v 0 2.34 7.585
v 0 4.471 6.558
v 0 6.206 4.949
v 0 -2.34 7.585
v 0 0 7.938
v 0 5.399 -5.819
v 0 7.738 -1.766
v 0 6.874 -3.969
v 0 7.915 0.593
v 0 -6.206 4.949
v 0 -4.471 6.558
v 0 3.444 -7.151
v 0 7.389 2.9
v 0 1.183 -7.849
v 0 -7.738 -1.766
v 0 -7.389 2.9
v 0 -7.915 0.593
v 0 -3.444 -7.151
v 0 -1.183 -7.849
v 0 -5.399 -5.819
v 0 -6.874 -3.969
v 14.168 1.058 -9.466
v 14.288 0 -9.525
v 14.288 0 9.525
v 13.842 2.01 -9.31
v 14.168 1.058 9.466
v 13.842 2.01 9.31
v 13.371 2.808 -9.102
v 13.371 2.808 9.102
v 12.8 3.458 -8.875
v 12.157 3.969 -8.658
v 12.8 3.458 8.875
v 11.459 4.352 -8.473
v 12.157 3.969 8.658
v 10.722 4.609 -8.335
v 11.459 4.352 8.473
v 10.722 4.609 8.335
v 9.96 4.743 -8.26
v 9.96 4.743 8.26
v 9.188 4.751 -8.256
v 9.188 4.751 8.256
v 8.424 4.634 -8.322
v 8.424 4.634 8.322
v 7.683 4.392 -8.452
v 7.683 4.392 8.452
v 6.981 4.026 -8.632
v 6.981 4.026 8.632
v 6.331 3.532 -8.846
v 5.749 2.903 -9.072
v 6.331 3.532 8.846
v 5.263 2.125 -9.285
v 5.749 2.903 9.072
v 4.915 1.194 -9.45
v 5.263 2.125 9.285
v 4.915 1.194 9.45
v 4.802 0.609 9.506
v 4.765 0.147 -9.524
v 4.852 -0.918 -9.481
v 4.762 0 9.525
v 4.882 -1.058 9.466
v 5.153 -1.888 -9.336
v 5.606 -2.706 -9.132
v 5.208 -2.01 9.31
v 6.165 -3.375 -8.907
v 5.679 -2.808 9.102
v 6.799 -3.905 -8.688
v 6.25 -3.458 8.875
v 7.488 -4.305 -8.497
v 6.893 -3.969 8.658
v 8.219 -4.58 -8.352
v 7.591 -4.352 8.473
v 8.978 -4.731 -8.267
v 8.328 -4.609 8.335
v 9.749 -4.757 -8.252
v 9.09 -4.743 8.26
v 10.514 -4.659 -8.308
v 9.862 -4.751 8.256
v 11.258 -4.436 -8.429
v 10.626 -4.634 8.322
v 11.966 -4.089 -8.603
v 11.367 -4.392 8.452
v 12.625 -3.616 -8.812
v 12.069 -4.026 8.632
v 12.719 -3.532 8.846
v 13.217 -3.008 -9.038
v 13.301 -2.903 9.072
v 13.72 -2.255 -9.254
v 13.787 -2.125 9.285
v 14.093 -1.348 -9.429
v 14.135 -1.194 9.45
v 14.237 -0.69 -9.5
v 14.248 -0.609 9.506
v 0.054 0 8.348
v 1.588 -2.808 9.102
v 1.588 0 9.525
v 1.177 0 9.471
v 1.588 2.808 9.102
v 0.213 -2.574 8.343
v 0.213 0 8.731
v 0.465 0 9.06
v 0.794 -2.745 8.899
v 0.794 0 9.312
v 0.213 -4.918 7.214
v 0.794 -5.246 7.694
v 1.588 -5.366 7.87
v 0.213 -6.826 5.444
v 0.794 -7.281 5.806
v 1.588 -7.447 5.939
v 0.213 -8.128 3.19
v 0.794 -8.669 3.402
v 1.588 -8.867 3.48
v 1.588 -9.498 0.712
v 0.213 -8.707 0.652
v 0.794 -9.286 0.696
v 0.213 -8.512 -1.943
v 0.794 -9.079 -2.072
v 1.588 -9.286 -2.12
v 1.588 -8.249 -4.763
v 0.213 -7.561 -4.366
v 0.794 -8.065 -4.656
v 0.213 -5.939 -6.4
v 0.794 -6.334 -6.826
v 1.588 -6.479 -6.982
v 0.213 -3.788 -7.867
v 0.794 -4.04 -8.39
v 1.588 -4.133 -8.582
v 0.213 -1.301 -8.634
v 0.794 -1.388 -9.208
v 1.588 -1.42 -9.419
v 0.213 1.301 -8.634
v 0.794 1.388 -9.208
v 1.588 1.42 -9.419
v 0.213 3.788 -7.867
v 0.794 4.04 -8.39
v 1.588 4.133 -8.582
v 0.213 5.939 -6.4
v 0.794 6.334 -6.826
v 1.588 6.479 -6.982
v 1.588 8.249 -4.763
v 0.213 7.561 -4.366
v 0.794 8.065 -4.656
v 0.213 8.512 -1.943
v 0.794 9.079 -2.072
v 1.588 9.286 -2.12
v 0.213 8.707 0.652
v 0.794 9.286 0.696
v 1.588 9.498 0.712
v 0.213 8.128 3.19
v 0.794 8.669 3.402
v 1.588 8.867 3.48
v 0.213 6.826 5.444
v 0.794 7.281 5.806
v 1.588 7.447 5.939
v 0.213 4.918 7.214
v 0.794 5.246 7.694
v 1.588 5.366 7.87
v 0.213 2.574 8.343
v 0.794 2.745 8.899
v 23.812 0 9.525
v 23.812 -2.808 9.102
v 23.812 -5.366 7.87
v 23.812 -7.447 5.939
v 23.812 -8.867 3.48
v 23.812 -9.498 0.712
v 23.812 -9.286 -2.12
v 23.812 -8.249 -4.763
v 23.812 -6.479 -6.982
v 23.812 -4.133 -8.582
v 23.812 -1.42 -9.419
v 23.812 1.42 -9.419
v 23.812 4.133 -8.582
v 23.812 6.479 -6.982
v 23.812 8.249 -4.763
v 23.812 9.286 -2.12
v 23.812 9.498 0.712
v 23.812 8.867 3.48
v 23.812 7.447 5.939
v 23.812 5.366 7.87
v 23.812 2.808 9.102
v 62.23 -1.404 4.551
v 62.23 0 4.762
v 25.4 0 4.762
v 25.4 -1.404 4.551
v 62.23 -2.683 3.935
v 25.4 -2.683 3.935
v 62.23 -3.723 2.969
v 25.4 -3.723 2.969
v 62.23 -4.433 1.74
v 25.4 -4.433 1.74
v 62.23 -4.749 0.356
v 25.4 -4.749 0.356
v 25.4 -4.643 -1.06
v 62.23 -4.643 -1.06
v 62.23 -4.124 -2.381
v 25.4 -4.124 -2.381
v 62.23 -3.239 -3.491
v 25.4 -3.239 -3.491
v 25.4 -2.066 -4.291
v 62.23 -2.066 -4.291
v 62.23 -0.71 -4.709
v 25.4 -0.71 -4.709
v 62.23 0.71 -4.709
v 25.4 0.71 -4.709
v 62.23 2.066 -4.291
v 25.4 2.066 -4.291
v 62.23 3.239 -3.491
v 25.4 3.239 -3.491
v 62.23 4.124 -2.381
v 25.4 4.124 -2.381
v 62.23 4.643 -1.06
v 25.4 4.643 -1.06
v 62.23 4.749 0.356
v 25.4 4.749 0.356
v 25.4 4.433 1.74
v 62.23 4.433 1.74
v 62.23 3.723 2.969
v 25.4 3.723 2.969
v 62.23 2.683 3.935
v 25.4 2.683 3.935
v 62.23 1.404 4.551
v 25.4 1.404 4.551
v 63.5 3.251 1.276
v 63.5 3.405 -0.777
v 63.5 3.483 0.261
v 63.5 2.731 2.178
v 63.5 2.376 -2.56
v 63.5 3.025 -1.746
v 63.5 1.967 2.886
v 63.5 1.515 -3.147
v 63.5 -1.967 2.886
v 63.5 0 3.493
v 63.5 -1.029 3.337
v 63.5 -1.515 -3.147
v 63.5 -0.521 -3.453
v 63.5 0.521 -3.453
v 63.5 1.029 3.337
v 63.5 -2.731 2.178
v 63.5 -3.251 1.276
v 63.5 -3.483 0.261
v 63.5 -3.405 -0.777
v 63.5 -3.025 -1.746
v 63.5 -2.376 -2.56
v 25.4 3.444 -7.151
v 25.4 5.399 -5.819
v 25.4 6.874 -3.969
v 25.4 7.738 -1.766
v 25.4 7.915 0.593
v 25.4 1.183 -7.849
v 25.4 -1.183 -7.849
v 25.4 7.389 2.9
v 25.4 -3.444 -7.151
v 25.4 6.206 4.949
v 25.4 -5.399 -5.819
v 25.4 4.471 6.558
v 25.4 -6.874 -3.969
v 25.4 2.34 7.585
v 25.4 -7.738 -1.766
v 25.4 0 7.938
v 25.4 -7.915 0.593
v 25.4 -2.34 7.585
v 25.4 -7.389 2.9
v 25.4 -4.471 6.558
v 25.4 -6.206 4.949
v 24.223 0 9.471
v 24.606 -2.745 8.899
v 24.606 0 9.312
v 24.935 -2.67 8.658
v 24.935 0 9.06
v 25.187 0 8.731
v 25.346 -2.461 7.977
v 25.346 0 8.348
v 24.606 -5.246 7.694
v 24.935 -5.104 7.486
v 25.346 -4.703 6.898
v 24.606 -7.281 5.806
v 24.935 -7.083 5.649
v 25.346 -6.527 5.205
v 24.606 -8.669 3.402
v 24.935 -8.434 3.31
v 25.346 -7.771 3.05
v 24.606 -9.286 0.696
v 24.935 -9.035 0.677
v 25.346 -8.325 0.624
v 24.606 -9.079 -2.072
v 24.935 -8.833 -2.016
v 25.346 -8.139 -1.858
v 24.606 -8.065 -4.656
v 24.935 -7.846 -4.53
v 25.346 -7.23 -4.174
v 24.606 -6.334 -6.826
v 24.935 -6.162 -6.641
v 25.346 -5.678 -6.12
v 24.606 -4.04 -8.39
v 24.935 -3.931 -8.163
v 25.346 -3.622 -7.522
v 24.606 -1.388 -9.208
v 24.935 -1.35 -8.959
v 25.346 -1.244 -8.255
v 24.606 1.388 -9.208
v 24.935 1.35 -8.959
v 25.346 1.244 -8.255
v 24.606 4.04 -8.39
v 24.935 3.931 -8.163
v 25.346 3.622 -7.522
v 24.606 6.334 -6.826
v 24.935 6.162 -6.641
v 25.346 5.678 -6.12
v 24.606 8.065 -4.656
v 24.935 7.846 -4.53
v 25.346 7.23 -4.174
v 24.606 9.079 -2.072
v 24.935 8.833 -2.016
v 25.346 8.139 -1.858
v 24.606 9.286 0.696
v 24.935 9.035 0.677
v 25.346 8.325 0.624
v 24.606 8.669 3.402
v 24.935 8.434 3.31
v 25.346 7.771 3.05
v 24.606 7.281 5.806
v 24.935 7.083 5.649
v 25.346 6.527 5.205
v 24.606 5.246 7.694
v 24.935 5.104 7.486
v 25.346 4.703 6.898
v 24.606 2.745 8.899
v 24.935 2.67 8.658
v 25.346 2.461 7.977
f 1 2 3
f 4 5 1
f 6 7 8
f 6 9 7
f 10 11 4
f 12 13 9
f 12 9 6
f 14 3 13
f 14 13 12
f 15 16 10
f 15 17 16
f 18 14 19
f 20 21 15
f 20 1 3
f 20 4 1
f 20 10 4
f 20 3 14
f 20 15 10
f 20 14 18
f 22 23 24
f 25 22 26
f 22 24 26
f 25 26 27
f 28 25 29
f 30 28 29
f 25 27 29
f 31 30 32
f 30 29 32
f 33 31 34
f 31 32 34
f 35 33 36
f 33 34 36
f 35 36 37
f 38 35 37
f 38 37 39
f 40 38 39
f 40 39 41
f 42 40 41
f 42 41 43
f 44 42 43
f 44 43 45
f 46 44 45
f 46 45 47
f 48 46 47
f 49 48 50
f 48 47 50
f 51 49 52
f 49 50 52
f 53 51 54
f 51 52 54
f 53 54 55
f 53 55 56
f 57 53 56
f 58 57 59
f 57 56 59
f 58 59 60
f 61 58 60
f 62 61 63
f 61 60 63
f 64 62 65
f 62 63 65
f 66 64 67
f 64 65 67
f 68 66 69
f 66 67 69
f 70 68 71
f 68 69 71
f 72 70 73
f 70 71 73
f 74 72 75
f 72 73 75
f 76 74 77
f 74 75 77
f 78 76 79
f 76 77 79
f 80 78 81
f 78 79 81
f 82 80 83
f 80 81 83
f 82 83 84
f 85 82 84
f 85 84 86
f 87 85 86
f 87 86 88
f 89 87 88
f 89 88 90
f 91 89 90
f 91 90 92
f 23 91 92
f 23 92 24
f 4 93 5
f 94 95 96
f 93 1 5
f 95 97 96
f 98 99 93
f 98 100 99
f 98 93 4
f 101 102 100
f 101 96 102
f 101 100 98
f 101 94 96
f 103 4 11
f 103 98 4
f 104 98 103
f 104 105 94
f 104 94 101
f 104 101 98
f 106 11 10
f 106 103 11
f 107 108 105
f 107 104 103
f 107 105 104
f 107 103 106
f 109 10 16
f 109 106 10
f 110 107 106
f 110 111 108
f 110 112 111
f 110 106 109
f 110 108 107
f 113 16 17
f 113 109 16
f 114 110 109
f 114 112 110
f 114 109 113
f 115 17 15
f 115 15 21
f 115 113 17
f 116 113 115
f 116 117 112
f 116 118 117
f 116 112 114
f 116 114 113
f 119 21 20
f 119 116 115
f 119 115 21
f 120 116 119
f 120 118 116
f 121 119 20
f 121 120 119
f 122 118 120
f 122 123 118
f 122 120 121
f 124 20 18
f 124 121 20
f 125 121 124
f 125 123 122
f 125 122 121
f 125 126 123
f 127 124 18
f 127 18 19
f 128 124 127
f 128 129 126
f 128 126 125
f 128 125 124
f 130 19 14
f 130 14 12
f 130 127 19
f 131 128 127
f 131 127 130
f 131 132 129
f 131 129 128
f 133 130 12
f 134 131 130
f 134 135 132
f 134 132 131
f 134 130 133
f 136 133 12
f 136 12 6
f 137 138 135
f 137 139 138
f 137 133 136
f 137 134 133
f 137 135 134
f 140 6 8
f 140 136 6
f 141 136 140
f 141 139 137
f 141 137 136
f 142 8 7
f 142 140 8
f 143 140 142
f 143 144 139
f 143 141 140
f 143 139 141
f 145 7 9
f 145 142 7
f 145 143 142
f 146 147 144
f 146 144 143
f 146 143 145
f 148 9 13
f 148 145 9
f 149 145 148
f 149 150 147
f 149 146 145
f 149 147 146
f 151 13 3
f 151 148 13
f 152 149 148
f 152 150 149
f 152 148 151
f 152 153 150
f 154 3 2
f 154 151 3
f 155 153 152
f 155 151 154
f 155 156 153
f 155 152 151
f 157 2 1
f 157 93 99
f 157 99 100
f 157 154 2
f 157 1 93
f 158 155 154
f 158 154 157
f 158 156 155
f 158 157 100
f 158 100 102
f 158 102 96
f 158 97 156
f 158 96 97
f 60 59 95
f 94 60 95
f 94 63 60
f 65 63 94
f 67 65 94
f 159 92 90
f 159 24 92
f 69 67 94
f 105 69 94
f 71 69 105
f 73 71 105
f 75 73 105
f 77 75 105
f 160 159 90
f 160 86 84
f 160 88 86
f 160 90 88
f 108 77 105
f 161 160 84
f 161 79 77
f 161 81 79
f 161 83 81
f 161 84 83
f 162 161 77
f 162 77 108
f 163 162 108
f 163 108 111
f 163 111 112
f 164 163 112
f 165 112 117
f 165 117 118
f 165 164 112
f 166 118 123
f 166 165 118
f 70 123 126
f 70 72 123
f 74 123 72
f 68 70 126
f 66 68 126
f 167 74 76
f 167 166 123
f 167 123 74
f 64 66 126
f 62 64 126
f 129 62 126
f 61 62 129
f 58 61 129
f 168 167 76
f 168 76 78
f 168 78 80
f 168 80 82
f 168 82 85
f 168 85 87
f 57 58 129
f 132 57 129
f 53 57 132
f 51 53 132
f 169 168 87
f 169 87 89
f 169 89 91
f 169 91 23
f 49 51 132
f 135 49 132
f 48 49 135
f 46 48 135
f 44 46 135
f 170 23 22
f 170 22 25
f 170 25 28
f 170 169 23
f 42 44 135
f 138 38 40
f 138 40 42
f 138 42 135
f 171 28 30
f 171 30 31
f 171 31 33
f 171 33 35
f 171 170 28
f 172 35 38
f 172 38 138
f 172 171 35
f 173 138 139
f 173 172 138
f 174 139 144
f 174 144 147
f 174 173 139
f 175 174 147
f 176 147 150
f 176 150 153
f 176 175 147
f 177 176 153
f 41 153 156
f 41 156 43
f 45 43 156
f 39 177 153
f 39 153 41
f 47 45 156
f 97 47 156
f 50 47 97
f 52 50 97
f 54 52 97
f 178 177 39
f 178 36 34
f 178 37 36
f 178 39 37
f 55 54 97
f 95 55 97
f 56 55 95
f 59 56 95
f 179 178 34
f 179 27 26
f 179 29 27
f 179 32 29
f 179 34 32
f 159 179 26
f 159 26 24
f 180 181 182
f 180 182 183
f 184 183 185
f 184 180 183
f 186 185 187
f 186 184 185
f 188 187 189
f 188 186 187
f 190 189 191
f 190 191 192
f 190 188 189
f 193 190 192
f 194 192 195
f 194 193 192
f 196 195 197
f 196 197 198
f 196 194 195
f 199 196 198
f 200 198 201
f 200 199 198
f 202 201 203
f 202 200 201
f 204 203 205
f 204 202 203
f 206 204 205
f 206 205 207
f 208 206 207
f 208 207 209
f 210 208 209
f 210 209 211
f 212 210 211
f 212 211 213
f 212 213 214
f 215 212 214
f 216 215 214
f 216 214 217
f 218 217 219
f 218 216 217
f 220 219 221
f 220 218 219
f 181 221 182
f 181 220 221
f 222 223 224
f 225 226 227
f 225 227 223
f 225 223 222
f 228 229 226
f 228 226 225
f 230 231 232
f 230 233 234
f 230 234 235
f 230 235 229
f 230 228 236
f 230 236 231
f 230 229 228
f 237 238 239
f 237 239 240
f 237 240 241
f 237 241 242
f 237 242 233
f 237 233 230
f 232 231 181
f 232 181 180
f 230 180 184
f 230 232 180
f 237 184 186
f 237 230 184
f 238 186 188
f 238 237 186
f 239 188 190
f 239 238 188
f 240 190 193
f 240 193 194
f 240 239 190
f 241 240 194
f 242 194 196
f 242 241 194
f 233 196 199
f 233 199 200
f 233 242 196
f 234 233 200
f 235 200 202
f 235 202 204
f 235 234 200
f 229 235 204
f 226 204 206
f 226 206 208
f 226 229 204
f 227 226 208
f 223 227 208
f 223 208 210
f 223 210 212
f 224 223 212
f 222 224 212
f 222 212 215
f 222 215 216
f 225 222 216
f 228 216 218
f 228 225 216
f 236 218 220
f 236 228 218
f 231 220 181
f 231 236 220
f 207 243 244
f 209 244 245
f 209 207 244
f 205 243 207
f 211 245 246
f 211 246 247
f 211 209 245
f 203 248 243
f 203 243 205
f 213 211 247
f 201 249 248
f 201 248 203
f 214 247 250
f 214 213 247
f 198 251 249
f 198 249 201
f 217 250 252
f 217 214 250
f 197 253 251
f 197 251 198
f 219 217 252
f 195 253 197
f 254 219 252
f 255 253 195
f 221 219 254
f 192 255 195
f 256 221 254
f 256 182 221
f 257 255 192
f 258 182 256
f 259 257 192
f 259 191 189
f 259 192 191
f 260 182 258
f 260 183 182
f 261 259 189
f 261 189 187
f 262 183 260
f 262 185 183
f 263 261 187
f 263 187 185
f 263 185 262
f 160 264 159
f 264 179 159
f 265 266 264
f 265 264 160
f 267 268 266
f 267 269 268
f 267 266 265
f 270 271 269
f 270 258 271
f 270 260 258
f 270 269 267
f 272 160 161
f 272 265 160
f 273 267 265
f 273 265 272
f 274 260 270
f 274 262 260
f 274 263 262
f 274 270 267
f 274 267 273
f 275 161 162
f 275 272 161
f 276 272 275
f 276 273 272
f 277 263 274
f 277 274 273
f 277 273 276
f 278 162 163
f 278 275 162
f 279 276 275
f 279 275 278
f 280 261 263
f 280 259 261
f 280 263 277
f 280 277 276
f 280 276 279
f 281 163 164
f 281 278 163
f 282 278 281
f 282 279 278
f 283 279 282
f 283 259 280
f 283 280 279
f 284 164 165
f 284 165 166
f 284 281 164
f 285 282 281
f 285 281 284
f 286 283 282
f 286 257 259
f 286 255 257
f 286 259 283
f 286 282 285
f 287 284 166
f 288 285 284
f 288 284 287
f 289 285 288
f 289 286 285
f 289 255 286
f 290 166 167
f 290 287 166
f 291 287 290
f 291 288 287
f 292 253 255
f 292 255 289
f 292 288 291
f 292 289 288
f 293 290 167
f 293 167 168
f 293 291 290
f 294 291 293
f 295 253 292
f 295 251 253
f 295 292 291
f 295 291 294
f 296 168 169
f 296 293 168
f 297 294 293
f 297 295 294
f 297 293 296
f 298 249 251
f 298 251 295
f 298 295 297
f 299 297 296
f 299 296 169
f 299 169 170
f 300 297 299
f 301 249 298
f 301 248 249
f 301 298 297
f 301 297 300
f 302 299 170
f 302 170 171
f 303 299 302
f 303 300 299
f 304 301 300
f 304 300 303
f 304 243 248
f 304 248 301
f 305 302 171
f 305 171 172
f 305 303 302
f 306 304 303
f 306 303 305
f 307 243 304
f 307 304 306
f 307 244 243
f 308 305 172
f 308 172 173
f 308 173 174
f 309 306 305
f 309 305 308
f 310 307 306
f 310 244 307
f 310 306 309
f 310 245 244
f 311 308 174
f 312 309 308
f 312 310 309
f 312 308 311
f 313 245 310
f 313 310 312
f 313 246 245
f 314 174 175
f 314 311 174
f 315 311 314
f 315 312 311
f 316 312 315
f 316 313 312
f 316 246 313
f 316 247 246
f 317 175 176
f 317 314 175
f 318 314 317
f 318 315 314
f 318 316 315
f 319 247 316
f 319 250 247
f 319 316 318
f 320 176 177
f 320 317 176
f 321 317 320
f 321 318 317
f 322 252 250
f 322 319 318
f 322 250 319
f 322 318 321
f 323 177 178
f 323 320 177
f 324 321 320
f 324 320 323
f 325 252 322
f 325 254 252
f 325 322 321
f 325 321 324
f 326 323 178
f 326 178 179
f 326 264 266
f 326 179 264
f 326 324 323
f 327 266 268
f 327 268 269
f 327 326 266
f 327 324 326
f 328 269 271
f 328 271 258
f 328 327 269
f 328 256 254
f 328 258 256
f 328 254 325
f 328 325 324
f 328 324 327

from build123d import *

# Parameters (mm, degrees)
FILLET1_R          = 1.5875
SKETCH2_R          = 4.7625
CUT_EXTRUDE2_DEPTH = 68.160068865
CHAMFER1_SIZE      = 1.27


with BuildPart() as part:
    # Sketch1 → Revolve1 (revolve)
    with BuildSketch(Plane.XY, mode=Mode.PRIVATE) as revolve1_sk:
        Polygon((0, 0), (0, 9.525), (25.4, 9.525), (25.4, 4.7625), (63.5, 4.7625), (63.5, 0), align=None)
    revolve(revolve1_sk.sketch.rotate(Axis((-10.444266115, 0, 0), (1, 0, 0)), 90), axis=Axis((-10.444266115, 0, 0), (1, 0, 0)))

    # Fillet1
    fillet1_edges = [part.edges().sort_by_distance(p)[0] for p in [
        (25.4, 0, -9.525),
        (0, 0, -9.525),
    ]]
    fillet(fillet1_edges, radius=FILLET1_R)

    # Sketch2 → Cut-Extrude2 (cut, through all)
    with BuildSketch(Plane.XY.offset(10.16)):
        with Locations((9.525, 0)):
            Circle(SKETCH2_R)
    extrude(amount=-CUT_EXTRUDE2_DEPTH, mode=Mode.SUBTRACT)

    # Chamfer1
    chamfer1_edges = [part.edges().sort_by_distance(p)[0] for p in [
        (63.5, 0, -4.7625),
    ]]
    chamfer(chamfer1_edges, length=CHAMFER1_SIZE)


solid = part.part
